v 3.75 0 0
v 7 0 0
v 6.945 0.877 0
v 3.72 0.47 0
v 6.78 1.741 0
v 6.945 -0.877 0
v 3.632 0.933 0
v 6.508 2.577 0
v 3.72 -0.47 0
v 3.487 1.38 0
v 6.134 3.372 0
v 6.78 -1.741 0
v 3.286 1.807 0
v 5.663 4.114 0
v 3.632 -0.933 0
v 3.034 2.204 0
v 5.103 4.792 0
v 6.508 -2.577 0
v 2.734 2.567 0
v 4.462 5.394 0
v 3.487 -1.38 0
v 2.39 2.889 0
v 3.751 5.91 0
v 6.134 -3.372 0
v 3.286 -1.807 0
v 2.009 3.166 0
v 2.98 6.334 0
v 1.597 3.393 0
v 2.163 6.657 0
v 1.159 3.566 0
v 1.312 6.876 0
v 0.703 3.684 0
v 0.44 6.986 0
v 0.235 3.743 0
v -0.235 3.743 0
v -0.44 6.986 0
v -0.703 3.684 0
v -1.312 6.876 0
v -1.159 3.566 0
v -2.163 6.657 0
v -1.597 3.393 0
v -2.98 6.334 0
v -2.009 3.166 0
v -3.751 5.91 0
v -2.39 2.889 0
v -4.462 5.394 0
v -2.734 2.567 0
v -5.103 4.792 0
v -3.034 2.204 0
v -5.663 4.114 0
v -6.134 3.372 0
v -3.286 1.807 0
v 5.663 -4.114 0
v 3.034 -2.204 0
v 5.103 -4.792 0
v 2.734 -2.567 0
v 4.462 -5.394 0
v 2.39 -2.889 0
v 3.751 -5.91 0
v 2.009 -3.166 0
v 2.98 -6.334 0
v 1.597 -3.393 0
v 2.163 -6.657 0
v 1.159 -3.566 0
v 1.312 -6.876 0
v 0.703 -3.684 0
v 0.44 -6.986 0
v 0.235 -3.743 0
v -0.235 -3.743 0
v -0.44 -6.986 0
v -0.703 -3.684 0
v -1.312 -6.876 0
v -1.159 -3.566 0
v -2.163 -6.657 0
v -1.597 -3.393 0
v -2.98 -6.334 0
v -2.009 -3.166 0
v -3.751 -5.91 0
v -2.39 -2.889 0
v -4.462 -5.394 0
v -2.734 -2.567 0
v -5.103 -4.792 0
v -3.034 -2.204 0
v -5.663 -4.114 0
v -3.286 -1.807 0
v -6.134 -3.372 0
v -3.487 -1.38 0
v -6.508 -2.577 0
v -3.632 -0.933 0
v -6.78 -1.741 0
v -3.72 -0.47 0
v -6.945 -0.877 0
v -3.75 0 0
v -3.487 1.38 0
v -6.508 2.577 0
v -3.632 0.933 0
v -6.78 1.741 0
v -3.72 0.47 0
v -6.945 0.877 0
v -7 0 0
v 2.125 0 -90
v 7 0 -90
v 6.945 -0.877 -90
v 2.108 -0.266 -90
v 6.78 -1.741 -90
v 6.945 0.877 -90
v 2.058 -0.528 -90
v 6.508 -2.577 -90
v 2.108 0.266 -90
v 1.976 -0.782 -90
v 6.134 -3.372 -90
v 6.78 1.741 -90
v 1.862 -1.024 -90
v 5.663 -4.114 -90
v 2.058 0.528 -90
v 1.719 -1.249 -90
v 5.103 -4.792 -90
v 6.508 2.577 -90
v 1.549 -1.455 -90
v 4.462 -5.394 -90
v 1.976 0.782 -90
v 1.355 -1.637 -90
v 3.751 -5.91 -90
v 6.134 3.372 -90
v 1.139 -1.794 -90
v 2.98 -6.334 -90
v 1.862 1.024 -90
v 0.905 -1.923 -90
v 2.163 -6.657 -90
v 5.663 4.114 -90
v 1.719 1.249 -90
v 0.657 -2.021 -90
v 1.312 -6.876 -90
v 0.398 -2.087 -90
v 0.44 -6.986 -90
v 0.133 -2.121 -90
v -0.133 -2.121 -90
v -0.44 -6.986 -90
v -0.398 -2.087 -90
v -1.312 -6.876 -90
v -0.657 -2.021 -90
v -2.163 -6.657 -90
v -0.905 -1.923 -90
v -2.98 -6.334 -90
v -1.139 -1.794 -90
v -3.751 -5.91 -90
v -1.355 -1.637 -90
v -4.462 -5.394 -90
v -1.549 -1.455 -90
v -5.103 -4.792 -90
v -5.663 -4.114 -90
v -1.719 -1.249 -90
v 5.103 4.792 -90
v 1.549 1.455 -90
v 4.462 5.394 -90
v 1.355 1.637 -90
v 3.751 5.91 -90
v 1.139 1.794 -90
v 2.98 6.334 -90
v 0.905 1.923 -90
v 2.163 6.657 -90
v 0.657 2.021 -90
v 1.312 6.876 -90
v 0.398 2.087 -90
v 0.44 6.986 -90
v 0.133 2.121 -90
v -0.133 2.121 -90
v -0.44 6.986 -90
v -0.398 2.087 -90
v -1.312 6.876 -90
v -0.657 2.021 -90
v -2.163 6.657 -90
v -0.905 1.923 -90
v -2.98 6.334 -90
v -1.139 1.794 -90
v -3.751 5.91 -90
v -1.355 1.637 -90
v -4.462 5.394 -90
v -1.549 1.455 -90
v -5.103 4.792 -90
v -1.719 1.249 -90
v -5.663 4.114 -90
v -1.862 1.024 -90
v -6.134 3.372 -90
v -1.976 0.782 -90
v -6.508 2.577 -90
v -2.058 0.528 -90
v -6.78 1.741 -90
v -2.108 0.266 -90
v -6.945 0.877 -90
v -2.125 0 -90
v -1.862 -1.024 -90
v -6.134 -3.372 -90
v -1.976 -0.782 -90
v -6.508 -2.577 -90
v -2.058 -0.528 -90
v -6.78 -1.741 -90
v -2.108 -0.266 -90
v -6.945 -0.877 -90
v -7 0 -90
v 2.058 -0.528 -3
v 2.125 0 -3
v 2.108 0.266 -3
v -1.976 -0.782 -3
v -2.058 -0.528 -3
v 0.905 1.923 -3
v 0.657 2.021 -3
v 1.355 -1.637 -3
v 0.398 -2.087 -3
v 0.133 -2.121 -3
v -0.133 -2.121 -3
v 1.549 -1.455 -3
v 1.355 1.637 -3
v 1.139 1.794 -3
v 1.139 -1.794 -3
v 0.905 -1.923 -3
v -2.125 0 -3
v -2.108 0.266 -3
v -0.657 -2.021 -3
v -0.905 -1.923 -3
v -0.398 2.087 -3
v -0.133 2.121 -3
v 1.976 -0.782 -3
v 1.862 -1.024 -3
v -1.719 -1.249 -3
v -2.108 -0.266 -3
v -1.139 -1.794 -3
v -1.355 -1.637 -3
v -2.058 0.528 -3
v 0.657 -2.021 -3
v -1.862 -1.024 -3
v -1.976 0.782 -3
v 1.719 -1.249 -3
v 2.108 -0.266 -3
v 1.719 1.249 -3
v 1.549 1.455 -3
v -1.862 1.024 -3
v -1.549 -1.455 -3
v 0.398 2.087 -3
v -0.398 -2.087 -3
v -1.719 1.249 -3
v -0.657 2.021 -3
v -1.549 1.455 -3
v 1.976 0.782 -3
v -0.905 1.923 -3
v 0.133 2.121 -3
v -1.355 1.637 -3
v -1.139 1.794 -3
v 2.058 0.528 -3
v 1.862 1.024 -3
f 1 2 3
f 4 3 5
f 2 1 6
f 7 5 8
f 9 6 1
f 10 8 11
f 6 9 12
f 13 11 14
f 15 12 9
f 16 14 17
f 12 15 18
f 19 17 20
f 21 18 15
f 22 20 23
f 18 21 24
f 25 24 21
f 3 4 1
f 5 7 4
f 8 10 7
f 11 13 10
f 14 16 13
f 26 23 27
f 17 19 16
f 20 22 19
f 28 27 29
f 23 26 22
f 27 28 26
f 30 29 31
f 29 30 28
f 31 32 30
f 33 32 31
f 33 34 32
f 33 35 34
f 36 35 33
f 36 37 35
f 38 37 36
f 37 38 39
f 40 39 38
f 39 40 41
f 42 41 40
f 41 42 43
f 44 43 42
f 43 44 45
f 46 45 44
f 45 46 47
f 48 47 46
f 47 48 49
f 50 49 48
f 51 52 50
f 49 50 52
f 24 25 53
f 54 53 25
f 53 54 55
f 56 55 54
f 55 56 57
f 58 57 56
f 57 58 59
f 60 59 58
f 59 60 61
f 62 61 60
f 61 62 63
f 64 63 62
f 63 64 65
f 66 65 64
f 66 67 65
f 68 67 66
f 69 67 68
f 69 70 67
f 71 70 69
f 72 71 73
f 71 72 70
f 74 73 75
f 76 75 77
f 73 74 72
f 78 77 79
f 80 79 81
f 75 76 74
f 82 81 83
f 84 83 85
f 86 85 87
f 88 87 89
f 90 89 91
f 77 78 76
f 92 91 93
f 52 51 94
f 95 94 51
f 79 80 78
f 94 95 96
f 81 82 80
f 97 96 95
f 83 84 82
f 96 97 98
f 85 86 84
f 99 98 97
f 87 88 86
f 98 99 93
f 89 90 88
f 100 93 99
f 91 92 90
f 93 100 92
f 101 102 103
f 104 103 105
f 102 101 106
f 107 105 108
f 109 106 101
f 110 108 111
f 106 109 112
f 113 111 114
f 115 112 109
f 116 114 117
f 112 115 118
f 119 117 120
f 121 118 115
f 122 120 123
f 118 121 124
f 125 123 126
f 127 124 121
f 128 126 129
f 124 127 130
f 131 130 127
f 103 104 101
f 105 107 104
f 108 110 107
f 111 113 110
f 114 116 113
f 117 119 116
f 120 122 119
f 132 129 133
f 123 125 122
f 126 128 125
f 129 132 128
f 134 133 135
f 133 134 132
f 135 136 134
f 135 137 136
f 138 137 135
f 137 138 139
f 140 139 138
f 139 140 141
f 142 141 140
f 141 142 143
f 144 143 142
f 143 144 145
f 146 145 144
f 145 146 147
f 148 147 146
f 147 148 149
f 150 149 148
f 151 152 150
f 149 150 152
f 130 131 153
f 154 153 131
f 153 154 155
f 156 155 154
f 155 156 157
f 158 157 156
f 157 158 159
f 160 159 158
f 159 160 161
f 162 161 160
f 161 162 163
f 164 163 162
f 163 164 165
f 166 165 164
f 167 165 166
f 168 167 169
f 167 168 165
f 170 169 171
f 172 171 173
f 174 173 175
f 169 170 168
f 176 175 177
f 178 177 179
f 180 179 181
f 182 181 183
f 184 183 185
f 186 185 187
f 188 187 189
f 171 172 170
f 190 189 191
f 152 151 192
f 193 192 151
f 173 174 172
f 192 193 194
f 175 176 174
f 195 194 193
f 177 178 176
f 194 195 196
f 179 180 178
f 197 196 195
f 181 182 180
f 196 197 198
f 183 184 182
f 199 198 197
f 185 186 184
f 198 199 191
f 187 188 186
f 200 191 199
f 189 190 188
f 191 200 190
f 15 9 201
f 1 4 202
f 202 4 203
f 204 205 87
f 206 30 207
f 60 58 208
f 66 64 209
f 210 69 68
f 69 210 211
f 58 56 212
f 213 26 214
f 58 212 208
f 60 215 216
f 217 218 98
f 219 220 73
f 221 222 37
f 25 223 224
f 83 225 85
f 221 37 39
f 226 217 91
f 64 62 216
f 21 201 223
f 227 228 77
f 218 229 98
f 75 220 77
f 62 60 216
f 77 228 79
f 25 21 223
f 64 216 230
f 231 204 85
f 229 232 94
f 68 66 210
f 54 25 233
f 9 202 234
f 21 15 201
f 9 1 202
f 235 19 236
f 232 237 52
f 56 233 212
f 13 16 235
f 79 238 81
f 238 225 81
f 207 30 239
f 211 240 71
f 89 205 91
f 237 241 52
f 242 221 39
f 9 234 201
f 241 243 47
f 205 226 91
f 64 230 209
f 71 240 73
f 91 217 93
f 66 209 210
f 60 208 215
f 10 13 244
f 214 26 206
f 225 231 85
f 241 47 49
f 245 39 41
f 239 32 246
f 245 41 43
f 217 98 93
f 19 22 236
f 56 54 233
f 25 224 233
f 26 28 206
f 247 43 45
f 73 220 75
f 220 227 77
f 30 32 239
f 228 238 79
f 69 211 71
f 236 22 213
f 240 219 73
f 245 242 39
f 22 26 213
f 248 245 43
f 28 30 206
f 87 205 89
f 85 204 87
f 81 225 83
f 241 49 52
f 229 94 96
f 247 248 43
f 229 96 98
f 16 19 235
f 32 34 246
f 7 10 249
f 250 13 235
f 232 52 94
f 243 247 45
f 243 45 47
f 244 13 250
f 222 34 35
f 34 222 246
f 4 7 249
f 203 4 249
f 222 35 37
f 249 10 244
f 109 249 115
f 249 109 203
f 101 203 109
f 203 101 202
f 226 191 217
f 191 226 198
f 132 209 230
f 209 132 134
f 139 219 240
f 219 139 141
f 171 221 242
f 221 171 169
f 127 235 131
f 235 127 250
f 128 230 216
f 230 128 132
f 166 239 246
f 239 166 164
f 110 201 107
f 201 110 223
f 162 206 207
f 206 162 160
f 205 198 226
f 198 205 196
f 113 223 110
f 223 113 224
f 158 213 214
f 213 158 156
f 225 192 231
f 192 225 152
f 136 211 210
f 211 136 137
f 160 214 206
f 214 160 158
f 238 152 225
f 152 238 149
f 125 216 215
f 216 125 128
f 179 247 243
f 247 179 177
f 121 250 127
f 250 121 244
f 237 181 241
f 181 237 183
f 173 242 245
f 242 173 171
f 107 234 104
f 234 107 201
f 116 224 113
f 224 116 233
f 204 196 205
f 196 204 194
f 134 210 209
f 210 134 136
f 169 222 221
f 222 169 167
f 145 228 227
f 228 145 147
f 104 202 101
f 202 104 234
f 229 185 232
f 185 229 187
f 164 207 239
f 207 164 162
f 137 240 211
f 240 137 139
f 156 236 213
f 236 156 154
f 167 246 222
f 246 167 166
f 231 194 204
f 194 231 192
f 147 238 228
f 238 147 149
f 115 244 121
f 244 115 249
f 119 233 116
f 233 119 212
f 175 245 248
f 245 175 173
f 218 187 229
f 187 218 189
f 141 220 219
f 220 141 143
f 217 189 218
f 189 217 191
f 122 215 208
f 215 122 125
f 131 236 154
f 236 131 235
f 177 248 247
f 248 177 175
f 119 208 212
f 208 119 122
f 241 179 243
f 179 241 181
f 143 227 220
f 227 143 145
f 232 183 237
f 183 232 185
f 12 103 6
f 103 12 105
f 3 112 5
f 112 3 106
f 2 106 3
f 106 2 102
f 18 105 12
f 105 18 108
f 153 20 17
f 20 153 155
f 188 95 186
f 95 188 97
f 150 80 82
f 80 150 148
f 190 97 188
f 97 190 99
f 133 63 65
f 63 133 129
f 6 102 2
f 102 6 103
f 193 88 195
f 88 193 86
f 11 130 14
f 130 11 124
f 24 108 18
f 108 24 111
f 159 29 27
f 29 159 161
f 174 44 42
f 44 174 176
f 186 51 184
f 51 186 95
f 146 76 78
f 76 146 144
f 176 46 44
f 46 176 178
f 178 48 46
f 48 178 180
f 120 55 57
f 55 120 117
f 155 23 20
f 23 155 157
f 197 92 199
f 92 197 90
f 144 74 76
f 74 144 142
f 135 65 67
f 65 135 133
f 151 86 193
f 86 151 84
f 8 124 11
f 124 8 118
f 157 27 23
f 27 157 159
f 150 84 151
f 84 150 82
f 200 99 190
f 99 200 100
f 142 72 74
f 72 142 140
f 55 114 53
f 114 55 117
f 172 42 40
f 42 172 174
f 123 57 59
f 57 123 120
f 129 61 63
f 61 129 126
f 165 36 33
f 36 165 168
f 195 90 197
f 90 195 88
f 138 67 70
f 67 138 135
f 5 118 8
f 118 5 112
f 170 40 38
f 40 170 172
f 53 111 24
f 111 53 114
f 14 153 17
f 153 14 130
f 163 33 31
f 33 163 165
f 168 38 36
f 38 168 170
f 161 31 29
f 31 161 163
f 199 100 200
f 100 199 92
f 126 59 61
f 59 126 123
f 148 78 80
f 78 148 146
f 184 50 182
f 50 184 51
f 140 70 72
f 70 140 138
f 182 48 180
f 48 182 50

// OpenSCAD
$fn = 50;


difference() {
	union() {
		translate(v = [0, 0, -90.0000000000]) {
			cylinder(h = 90, r = 7.0000000000);
		}
		cylinder(h = 0, r = 10.0000000000);
	}
	union() {
		translate(v = [0, 0, 0]) {
			rotate(a = [0, 0, 0]) {
				difference() {
					union() {
						#translate(v = [0, 0, -90.0000000000]) {
							cylinder(h = 90, r = 2.0000000000);
						}
						#translate(v = [0, 0, -3]) {
							cylinder(h = 3, r1 = 2.1250000000, r2 = 3.7500000000);
						}
						#translate(v = [0, 0, -90.0000000000]) {
							cylinder(h = 90, r = 2.1250000000);
						}
						#translate(v = [0, 0, -90.0000000000]) {
							cylinder(h = 90, r = 2.0000000000);
						}
					}
					union();
				}
			}
		}
	}
}
